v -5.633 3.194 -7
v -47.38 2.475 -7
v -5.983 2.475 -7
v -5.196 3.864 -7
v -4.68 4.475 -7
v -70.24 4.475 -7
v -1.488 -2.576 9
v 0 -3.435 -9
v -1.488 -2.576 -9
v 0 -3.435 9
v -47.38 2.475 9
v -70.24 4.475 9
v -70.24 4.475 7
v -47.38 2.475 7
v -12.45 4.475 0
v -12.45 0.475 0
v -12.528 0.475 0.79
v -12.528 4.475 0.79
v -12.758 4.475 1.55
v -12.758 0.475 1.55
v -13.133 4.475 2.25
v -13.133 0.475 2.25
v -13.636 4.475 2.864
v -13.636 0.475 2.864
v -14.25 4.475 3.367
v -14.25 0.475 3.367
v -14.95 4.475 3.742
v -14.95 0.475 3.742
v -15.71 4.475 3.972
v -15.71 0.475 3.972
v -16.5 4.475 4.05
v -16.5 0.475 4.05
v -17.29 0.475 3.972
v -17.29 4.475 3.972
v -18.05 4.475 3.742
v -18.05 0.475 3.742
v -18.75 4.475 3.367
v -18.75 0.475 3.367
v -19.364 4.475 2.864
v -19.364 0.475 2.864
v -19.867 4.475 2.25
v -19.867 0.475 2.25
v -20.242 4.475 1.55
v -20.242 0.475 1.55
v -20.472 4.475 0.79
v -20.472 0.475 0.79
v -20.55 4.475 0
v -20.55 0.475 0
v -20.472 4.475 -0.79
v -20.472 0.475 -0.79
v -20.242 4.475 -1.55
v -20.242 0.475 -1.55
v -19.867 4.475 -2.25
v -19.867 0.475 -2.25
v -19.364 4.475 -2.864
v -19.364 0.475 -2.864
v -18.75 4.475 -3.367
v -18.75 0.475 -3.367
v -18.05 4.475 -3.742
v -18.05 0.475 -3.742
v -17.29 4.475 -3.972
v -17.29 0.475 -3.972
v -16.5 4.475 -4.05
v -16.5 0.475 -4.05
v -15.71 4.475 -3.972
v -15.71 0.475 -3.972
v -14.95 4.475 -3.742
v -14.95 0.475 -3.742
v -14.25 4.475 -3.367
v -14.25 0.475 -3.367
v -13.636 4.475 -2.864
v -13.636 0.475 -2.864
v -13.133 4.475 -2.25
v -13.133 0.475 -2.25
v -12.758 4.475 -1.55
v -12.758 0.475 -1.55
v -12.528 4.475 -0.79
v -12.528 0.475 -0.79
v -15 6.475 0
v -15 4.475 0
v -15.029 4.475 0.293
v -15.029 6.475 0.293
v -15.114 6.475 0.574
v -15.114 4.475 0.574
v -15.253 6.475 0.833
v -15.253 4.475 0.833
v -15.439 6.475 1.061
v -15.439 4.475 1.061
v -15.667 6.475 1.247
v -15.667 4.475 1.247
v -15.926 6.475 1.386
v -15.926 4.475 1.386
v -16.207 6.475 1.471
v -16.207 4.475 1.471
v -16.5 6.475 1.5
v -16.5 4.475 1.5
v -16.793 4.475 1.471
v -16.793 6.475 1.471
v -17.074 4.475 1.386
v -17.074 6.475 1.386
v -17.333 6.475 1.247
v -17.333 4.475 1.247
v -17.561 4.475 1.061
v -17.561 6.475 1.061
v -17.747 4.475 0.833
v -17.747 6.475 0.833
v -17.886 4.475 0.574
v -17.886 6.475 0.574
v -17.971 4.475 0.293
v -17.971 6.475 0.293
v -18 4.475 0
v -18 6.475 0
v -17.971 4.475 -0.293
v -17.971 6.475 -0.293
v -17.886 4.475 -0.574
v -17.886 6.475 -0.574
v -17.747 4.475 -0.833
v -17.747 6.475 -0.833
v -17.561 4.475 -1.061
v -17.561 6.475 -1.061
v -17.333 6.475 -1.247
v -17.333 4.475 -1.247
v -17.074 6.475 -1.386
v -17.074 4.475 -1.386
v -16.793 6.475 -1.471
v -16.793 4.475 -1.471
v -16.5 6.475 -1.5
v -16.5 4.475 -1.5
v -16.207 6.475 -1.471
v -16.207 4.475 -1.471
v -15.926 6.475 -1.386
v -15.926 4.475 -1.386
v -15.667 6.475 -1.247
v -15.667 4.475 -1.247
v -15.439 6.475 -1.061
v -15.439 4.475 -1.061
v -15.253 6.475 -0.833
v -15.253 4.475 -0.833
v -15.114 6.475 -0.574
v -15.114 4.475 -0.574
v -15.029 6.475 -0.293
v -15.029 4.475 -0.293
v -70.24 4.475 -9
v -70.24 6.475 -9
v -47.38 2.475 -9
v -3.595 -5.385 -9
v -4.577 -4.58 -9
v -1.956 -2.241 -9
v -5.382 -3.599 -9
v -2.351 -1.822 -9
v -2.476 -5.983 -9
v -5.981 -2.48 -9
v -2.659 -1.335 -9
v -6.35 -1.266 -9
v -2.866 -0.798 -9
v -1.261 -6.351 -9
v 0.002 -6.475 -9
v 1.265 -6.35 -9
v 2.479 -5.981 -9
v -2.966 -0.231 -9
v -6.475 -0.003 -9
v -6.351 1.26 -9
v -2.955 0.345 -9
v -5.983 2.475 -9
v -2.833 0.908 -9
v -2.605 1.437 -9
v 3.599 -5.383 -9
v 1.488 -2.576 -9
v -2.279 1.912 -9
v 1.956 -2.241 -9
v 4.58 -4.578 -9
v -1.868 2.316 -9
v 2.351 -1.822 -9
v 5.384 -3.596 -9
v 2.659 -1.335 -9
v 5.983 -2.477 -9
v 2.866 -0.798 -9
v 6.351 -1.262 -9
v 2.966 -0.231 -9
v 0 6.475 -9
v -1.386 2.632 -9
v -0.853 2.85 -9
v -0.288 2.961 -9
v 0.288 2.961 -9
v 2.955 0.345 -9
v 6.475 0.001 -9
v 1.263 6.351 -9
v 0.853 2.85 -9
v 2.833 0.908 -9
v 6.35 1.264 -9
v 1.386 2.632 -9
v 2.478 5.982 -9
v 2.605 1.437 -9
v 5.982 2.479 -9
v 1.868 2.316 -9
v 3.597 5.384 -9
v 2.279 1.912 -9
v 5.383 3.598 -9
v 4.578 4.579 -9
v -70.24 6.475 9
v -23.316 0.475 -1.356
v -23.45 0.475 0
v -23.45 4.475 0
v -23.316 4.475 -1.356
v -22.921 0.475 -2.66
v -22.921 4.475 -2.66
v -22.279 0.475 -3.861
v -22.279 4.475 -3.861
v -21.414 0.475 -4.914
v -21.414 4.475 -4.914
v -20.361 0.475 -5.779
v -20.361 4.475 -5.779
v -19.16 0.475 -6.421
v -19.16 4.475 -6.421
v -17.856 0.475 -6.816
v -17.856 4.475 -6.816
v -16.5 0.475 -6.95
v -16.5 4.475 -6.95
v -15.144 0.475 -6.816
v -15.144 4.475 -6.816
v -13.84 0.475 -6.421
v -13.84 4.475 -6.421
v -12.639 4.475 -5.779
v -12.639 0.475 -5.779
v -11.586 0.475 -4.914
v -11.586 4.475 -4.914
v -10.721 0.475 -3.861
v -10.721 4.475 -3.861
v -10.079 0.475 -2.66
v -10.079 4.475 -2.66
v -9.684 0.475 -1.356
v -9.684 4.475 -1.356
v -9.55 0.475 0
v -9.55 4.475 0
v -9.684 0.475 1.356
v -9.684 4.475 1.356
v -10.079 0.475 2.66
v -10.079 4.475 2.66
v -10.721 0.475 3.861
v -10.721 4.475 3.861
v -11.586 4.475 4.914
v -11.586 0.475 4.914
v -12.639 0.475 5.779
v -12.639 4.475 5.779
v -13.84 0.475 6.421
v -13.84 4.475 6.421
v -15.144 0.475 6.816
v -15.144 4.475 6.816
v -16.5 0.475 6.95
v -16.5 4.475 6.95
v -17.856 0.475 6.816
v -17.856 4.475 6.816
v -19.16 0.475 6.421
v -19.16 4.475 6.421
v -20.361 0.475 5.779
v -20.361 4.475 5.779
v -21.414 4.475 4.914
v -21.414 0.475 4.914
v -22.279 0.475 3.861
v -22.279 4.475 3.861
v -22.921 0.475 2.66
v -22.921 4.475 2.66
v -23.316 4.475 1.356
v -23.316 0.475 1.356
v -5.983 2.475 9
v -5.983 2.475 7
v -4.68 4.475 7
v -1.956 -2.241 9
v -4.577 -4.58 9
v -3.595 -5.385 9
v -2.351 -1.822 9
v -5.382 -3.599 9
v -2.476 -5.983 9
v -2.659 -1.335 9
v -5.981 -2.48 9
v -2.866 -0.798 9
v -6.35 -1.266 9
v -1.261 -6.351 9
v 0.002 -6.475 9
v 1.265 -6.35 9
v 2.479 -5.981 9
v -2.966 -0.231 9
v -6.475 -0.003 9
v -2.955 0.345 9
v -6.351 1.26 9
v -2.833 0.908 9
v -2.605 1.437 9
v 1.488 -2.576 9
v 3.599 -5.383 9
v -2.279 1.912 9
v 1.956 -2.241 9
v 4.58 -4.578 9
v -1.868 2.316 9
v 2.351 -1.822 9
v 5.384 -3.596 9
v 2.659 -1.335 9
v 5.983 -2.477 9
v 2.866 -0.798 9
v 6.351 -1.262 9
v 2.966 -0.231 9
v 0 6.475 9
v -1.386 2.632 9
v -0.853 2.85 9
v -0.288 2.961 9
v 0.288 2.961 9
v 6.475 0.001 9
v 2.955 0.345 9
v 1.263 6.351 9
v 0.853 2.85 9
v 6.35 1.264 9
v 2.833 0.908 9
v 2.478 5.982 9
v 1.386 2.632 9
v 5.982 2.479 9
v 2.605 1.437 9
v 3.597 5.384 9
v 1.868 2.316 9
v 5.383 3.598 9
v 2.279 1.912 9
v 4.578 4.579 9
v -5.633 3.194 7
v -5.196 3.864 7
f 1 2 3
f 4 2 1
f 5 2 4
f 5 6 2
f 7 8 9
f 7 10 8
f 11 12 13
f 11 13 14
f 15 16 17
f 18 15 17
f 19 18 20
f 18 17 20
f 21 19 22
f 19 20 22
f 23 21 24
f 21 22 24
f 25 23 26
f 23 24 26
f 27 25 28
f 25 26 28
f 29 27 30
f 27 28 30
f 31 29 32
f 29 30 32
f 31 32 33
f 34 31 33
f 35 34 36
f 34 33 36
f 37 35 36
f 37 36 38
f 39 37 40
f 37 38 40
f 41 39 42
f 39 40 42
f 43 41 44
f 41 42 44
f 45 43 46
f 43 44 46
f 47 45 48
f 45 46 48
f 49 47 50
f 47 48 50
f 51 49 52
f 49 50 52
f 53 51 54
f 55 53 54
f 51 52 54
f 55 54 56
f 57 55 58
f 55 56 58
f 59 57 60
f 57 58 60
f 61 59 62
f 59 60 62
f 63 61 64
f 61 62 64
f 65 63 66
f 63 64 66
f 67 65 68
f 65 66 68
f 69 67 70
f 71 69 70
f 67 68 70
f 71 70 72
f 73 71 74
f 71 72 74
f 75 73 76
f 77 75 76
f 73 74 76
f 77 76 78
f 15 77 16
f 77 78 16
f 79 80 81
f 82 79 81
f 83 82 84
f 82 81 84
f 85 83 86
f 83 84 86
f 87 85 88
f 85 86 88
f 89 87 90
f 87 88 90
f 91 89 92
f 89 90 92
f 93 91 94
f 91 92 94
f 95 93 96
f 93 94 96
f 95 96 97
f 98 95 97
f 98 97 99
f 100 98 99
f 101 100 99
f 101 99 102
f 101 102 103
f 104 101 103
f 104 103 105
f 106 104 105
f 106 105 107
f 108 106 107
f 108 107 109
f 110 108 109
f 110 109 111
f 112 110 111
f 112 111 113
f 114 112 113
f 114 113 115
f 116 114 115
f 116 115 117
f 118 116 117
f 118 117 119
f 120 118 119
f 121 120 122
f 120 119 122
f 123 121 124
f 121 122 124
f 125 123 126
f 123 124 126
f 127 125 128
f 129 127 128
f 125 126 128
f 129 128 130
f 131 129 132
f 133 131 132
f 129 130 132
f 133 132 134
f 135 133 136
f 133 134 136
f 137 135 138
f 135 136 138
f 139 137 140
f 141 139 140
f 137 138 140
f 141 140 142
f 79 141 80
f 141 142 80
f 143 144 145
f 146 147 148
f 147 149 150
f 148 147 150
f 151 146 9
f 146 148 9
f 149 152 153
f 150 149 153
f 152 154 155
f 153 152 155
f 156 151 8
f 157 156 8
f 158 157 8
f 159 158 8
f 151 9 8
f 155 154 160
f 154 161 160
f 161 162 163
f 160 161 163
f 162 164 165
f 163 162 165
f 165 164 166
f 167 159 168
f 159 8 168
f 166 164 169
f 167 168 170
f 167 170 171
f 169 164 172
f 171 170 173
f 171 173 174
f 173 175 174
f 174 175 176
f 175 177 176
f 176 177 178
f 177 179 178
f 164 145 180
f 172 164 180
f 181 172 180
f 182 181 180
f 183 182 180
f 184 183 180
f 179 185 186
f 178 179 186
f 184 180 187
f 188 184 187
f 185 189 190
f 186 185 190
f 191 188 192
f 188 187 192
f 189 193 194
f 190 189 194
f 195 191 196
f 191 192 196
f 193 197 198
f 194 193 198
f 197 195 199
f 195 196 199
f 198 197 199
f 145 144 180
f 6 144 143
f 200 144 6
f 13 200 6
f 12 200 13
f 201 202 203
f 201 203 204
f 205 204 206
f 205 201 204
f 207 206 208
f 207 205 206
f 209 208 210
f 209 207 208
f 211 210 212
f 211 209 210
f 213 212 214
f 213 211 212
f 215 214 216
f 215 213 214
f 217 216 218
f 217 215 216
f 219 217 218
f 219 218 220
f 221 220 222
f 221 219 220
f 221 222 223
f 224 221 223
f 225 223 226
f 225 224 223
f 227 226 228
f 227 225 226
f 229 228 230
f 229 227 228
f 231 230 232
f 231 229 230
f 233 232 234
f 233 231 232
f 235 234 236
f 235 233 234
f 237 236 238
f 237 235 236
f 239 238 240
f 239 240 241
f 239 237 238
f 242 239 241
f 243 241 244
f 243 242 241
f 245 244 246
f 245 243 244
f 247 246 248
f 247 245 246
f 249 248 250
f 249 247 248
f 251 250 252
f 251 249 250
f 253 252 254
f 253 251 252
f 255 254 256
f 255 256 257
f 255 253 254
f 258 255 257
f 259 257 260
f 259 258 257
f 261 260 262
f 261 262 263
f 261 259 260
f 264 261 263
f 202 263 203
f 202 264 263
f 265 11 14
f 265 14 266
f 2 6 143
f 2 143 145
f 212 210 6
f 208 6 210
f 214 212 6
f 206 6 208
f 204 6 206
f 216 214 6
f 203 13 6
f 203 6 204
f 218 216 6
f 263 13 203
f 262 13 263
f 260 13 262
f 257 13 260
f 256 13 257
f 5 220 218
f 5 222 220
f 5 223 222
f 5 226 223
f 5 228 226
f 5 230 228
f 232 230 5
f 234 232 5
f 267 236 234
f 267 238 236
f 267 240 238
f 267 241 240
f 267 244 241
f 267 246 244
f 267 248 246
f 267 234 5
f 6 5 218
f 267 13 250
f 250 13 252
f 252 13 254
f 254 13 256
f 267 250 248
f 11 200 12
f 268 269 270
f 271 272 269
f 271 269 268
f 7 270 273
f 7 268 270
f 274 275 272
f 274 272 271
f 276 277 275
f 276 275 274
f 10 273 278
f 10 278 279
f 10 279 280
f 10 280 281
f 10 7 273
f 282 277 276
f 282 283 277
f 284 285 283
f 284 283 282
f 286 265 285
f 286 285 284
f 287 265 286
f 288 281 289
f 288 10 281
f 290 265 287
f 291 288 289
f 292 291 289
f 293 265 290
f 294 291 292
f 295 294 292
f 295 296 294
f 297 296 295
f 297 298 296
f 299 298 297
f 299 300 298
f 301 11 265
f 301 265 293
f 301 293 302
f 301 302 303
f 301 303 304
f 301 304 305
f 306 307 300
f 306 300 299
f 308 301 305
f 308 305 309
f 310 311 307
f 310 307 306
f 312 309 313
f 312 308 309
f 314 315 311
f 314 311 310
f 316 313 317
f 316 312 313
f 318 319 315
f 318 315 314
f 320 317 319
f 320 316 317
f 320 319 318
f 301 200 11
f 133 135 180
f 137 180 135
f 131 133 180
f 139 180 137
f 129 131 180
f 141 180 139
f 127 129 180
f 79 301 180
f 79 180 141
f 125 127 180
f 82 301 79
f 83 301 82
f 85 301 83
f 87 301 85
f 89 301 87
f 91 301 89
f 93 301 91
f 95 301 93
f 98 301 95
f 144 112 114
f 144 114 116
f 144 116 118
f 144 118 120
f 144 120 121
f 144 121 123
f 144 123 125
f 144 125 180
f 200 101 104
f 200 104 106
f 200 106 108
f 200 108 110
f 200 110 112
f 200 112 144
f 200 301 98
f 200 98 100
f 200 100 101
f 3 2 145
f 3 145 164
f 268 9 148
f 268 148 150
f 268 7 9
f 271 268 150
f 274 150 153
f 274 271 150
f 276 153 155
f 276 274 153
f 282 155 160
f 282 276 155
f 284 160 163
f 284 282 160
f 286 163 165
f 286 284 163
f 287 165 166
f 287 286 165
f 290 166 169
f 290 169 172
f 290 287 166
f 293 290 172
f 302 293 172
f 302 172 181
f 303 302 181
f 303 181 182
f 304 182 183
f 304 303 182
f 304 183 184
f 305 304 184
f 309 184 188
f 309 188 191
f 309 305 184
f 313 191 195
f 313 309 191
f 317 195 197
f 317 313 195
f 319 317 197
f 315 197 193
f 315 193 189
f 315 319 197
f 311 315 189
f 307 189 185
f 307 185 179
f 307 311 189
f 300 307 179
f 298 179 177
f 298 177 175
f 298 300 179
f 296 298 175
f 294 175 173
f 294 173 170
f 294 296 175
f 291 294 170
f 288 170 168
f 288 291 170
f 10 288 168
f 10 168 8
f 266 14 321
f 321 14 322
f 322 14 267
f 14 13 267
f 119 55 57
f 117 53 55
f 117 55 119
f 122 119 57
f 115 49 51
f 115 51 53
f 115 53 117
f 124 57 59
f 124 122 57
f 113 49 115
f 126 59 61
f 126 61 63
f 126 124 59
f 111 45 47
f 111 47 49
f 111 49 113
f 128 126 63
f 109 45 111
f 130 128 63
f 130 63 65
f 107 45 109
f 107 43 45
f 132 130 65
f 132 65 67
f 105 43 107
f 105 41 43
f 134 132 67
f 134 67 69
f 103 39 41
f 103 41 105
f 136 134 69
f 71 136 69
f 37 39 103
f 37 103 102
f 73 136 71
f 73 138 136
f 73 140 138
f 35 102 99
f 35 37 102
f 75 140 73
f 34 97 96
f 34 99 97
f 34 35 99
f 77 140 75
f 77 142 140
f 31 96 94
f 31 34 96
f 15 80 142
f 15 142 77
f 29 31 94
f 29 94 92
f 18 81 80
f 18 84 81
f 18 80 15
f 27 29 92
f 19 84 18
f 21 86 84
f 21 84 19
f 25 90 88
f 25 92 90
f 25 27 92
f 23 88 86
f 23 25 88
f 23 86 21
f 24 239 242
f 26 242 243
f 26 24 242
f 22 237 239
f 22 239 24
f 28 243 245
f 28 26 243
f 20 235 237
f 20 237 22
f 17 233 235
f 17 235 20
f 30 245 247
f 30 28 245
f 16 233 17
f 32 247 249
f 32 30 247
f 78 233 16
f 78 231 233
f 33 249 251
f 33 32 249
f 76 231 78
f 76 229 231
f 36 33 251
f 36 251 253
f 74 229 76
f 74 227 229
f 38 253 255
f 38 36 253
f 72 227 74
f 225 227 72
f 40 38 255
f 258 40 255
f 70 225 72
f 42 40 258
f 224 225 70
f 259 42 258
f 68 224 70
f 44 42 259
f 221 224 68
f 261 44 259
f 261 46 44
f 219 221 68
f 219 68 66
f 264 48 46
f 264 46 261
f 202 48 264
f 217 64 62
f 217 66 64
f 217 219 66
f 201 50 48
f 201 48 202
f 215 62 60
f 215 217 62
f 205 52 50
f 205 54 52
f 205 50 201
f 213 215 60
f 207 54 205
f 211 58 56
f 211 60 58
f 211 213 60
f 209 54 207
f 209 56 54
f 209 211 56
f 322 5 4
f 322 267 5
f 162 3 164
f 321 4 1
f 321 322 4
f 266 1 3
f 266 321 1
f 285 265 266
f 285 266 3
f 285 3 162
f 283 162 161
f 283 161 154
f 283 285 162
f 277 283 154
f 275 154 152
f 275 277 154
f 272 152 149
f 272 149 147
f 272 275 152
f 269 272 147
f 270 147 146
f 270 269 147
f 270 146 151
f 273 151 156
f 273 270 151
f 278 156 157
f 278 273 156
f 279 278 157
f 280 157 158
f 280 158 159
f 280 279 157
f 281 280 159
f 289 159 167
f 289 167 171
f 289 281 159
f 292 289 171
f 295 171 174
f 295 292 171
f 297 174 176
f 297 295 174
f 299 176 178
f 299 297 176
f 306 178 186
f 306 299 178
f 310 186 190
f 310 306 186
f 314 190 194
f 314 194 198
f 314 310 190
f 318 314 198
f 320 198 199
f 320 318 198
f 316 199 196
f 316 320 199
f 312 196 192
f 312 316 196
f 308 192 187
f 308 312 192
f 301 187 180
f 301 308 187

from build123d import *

# Parameters (mm, degrees)
MAIN_DEPTH          = 9
RIB_START           = -7
RIB_DEPTH           = 2
BOSS_EXTRUDE1_START = 9
BOSS_EXTRUDE1_DEPTH = 2
SKETCH2_R           = 1.5
CUT_EXTRUDE1_DEPTH  = 72.656236938
BOSS_EXTRUDE2_START = 4
SKETCH2_4_R         = 6.95
SKETCH2_4_R_2       = 4.05
SKETCH2_4_R_3       = 1.5
BOSS_EXTRUDE2_DEPTH = 4


with BuildPart() as part:
    # Sketch1 → main (new, symmetric)
    with BuildSketch(Plane.XY):
        with BuildLine():
            Line((0, 6.475), (-70.2404, 6.475))
            Line((-70.2404, 6.475), (-70.2404, 4.475))
            Line((-70.2404, 4.475), (-4.679743583, 4.475))
            ThreePointArc((-4.679743583, 4.475), (2.54460213, -5.954042744), (0, 6.475))
        make_face()
        with BuildLine():
            Line((1.4875, -2.576425576), (0, -3.435234102))
            Line((0, -3.435234102), (-1.4875, -2.576425576))
            ThreePointArc((-1.4875, -2.576425576), (0, 2.975), (1.4875, -2.576425576))
        make_face(mode=Mode.SUBTRACT)
    extrude(amount=MAIN_DEPTH, both=True)

    # Sketch1<4> → rib (add)
    with BuildSketch(Plane.XY.offset(RIB_START)):
        with BuildLine():
            Line((-47.380295394, 2.475), (-5.983310121, 2.475))
            ThreePointArc((-5.983310121, 2.475), (-5.424498002, 3.53559704), (-4.679743583, 4.475))
            Line((-4.679743583, 4.475), (-70.2404, 4.475))
            Line((-70.2404, 4.475), (-47.380295394, 2.475))
        make_face()
    extrude(amount=-RIB_DEPTH)

    # Sketch1<5> → Boss-Extrude1 (add)
    with BuildSketch(Plane.XY.offset(BOSS_EXTRUDE1_START)):
        with BuildLine():
            Line((-47.380295394, 2.475), (-5.983310121, 2.475))
            ThreePointArc((-5.983310121, 2.475), (-5.424498002, 3.53559704), (-4.679743583, 4.475))
            Line((-4.679743583, 4.475), (-70.2404, 4.475))
            Line((-70.2404, 4.475), (-47.380295394, 2.475))
        make_face()
    extrude(amount=-BOSS_EXTRUDE1_DEPTH)

    # Sketch2 → Cut-Extrude1 (cut, through all)
    with BuildSketch(Plane.XZ.offset(-4.475)):
        with Locations((-16.5, 0)):
            Circle(SKETCH2_R)
    extrude(amount=-CUT_EXTRUDE1_DEPTH, mode=Mode.SUBTRACT)

    # Sketch2<4> → Boss-Extrude2 (add)
    # profile 1 of 2: a face of its own
    with BuildSketch(Plane.XZ.offset(-4.475).offset(BOSS_EXTRUDE2_START)):
        with Locations(Location((-16.5, 0, 0), (0, 0, 180))):
            Circle(SKETCH2_4_R)
        with Locations((-16.5, 0)):
            Circle(SKETCH2_4_R_2, mode=Mode.SUBTRACT)
    # profile 2 of 2: a face of its own
    with BuildSketch(Plane.XZ.offset(-4.475).offset(BOSS_EXTRUDE2_START)):
        with Locations((-16.5, 0)):
            Circle(SKETCH2_4_R_3)
    extrude(amount=-BOSS_EXTRUDE2_DEPTH)


with BuildPart() as boss_extrude2_kept_piece:
    # of the separate pieces the step leaves, the one the design keeps (boss_extrude2_pieces_kept)
    add(part.part.solids().sort_by_distance((0, 6.475, -9))[0])


solid = boss_extrude2_kept_piece.part
